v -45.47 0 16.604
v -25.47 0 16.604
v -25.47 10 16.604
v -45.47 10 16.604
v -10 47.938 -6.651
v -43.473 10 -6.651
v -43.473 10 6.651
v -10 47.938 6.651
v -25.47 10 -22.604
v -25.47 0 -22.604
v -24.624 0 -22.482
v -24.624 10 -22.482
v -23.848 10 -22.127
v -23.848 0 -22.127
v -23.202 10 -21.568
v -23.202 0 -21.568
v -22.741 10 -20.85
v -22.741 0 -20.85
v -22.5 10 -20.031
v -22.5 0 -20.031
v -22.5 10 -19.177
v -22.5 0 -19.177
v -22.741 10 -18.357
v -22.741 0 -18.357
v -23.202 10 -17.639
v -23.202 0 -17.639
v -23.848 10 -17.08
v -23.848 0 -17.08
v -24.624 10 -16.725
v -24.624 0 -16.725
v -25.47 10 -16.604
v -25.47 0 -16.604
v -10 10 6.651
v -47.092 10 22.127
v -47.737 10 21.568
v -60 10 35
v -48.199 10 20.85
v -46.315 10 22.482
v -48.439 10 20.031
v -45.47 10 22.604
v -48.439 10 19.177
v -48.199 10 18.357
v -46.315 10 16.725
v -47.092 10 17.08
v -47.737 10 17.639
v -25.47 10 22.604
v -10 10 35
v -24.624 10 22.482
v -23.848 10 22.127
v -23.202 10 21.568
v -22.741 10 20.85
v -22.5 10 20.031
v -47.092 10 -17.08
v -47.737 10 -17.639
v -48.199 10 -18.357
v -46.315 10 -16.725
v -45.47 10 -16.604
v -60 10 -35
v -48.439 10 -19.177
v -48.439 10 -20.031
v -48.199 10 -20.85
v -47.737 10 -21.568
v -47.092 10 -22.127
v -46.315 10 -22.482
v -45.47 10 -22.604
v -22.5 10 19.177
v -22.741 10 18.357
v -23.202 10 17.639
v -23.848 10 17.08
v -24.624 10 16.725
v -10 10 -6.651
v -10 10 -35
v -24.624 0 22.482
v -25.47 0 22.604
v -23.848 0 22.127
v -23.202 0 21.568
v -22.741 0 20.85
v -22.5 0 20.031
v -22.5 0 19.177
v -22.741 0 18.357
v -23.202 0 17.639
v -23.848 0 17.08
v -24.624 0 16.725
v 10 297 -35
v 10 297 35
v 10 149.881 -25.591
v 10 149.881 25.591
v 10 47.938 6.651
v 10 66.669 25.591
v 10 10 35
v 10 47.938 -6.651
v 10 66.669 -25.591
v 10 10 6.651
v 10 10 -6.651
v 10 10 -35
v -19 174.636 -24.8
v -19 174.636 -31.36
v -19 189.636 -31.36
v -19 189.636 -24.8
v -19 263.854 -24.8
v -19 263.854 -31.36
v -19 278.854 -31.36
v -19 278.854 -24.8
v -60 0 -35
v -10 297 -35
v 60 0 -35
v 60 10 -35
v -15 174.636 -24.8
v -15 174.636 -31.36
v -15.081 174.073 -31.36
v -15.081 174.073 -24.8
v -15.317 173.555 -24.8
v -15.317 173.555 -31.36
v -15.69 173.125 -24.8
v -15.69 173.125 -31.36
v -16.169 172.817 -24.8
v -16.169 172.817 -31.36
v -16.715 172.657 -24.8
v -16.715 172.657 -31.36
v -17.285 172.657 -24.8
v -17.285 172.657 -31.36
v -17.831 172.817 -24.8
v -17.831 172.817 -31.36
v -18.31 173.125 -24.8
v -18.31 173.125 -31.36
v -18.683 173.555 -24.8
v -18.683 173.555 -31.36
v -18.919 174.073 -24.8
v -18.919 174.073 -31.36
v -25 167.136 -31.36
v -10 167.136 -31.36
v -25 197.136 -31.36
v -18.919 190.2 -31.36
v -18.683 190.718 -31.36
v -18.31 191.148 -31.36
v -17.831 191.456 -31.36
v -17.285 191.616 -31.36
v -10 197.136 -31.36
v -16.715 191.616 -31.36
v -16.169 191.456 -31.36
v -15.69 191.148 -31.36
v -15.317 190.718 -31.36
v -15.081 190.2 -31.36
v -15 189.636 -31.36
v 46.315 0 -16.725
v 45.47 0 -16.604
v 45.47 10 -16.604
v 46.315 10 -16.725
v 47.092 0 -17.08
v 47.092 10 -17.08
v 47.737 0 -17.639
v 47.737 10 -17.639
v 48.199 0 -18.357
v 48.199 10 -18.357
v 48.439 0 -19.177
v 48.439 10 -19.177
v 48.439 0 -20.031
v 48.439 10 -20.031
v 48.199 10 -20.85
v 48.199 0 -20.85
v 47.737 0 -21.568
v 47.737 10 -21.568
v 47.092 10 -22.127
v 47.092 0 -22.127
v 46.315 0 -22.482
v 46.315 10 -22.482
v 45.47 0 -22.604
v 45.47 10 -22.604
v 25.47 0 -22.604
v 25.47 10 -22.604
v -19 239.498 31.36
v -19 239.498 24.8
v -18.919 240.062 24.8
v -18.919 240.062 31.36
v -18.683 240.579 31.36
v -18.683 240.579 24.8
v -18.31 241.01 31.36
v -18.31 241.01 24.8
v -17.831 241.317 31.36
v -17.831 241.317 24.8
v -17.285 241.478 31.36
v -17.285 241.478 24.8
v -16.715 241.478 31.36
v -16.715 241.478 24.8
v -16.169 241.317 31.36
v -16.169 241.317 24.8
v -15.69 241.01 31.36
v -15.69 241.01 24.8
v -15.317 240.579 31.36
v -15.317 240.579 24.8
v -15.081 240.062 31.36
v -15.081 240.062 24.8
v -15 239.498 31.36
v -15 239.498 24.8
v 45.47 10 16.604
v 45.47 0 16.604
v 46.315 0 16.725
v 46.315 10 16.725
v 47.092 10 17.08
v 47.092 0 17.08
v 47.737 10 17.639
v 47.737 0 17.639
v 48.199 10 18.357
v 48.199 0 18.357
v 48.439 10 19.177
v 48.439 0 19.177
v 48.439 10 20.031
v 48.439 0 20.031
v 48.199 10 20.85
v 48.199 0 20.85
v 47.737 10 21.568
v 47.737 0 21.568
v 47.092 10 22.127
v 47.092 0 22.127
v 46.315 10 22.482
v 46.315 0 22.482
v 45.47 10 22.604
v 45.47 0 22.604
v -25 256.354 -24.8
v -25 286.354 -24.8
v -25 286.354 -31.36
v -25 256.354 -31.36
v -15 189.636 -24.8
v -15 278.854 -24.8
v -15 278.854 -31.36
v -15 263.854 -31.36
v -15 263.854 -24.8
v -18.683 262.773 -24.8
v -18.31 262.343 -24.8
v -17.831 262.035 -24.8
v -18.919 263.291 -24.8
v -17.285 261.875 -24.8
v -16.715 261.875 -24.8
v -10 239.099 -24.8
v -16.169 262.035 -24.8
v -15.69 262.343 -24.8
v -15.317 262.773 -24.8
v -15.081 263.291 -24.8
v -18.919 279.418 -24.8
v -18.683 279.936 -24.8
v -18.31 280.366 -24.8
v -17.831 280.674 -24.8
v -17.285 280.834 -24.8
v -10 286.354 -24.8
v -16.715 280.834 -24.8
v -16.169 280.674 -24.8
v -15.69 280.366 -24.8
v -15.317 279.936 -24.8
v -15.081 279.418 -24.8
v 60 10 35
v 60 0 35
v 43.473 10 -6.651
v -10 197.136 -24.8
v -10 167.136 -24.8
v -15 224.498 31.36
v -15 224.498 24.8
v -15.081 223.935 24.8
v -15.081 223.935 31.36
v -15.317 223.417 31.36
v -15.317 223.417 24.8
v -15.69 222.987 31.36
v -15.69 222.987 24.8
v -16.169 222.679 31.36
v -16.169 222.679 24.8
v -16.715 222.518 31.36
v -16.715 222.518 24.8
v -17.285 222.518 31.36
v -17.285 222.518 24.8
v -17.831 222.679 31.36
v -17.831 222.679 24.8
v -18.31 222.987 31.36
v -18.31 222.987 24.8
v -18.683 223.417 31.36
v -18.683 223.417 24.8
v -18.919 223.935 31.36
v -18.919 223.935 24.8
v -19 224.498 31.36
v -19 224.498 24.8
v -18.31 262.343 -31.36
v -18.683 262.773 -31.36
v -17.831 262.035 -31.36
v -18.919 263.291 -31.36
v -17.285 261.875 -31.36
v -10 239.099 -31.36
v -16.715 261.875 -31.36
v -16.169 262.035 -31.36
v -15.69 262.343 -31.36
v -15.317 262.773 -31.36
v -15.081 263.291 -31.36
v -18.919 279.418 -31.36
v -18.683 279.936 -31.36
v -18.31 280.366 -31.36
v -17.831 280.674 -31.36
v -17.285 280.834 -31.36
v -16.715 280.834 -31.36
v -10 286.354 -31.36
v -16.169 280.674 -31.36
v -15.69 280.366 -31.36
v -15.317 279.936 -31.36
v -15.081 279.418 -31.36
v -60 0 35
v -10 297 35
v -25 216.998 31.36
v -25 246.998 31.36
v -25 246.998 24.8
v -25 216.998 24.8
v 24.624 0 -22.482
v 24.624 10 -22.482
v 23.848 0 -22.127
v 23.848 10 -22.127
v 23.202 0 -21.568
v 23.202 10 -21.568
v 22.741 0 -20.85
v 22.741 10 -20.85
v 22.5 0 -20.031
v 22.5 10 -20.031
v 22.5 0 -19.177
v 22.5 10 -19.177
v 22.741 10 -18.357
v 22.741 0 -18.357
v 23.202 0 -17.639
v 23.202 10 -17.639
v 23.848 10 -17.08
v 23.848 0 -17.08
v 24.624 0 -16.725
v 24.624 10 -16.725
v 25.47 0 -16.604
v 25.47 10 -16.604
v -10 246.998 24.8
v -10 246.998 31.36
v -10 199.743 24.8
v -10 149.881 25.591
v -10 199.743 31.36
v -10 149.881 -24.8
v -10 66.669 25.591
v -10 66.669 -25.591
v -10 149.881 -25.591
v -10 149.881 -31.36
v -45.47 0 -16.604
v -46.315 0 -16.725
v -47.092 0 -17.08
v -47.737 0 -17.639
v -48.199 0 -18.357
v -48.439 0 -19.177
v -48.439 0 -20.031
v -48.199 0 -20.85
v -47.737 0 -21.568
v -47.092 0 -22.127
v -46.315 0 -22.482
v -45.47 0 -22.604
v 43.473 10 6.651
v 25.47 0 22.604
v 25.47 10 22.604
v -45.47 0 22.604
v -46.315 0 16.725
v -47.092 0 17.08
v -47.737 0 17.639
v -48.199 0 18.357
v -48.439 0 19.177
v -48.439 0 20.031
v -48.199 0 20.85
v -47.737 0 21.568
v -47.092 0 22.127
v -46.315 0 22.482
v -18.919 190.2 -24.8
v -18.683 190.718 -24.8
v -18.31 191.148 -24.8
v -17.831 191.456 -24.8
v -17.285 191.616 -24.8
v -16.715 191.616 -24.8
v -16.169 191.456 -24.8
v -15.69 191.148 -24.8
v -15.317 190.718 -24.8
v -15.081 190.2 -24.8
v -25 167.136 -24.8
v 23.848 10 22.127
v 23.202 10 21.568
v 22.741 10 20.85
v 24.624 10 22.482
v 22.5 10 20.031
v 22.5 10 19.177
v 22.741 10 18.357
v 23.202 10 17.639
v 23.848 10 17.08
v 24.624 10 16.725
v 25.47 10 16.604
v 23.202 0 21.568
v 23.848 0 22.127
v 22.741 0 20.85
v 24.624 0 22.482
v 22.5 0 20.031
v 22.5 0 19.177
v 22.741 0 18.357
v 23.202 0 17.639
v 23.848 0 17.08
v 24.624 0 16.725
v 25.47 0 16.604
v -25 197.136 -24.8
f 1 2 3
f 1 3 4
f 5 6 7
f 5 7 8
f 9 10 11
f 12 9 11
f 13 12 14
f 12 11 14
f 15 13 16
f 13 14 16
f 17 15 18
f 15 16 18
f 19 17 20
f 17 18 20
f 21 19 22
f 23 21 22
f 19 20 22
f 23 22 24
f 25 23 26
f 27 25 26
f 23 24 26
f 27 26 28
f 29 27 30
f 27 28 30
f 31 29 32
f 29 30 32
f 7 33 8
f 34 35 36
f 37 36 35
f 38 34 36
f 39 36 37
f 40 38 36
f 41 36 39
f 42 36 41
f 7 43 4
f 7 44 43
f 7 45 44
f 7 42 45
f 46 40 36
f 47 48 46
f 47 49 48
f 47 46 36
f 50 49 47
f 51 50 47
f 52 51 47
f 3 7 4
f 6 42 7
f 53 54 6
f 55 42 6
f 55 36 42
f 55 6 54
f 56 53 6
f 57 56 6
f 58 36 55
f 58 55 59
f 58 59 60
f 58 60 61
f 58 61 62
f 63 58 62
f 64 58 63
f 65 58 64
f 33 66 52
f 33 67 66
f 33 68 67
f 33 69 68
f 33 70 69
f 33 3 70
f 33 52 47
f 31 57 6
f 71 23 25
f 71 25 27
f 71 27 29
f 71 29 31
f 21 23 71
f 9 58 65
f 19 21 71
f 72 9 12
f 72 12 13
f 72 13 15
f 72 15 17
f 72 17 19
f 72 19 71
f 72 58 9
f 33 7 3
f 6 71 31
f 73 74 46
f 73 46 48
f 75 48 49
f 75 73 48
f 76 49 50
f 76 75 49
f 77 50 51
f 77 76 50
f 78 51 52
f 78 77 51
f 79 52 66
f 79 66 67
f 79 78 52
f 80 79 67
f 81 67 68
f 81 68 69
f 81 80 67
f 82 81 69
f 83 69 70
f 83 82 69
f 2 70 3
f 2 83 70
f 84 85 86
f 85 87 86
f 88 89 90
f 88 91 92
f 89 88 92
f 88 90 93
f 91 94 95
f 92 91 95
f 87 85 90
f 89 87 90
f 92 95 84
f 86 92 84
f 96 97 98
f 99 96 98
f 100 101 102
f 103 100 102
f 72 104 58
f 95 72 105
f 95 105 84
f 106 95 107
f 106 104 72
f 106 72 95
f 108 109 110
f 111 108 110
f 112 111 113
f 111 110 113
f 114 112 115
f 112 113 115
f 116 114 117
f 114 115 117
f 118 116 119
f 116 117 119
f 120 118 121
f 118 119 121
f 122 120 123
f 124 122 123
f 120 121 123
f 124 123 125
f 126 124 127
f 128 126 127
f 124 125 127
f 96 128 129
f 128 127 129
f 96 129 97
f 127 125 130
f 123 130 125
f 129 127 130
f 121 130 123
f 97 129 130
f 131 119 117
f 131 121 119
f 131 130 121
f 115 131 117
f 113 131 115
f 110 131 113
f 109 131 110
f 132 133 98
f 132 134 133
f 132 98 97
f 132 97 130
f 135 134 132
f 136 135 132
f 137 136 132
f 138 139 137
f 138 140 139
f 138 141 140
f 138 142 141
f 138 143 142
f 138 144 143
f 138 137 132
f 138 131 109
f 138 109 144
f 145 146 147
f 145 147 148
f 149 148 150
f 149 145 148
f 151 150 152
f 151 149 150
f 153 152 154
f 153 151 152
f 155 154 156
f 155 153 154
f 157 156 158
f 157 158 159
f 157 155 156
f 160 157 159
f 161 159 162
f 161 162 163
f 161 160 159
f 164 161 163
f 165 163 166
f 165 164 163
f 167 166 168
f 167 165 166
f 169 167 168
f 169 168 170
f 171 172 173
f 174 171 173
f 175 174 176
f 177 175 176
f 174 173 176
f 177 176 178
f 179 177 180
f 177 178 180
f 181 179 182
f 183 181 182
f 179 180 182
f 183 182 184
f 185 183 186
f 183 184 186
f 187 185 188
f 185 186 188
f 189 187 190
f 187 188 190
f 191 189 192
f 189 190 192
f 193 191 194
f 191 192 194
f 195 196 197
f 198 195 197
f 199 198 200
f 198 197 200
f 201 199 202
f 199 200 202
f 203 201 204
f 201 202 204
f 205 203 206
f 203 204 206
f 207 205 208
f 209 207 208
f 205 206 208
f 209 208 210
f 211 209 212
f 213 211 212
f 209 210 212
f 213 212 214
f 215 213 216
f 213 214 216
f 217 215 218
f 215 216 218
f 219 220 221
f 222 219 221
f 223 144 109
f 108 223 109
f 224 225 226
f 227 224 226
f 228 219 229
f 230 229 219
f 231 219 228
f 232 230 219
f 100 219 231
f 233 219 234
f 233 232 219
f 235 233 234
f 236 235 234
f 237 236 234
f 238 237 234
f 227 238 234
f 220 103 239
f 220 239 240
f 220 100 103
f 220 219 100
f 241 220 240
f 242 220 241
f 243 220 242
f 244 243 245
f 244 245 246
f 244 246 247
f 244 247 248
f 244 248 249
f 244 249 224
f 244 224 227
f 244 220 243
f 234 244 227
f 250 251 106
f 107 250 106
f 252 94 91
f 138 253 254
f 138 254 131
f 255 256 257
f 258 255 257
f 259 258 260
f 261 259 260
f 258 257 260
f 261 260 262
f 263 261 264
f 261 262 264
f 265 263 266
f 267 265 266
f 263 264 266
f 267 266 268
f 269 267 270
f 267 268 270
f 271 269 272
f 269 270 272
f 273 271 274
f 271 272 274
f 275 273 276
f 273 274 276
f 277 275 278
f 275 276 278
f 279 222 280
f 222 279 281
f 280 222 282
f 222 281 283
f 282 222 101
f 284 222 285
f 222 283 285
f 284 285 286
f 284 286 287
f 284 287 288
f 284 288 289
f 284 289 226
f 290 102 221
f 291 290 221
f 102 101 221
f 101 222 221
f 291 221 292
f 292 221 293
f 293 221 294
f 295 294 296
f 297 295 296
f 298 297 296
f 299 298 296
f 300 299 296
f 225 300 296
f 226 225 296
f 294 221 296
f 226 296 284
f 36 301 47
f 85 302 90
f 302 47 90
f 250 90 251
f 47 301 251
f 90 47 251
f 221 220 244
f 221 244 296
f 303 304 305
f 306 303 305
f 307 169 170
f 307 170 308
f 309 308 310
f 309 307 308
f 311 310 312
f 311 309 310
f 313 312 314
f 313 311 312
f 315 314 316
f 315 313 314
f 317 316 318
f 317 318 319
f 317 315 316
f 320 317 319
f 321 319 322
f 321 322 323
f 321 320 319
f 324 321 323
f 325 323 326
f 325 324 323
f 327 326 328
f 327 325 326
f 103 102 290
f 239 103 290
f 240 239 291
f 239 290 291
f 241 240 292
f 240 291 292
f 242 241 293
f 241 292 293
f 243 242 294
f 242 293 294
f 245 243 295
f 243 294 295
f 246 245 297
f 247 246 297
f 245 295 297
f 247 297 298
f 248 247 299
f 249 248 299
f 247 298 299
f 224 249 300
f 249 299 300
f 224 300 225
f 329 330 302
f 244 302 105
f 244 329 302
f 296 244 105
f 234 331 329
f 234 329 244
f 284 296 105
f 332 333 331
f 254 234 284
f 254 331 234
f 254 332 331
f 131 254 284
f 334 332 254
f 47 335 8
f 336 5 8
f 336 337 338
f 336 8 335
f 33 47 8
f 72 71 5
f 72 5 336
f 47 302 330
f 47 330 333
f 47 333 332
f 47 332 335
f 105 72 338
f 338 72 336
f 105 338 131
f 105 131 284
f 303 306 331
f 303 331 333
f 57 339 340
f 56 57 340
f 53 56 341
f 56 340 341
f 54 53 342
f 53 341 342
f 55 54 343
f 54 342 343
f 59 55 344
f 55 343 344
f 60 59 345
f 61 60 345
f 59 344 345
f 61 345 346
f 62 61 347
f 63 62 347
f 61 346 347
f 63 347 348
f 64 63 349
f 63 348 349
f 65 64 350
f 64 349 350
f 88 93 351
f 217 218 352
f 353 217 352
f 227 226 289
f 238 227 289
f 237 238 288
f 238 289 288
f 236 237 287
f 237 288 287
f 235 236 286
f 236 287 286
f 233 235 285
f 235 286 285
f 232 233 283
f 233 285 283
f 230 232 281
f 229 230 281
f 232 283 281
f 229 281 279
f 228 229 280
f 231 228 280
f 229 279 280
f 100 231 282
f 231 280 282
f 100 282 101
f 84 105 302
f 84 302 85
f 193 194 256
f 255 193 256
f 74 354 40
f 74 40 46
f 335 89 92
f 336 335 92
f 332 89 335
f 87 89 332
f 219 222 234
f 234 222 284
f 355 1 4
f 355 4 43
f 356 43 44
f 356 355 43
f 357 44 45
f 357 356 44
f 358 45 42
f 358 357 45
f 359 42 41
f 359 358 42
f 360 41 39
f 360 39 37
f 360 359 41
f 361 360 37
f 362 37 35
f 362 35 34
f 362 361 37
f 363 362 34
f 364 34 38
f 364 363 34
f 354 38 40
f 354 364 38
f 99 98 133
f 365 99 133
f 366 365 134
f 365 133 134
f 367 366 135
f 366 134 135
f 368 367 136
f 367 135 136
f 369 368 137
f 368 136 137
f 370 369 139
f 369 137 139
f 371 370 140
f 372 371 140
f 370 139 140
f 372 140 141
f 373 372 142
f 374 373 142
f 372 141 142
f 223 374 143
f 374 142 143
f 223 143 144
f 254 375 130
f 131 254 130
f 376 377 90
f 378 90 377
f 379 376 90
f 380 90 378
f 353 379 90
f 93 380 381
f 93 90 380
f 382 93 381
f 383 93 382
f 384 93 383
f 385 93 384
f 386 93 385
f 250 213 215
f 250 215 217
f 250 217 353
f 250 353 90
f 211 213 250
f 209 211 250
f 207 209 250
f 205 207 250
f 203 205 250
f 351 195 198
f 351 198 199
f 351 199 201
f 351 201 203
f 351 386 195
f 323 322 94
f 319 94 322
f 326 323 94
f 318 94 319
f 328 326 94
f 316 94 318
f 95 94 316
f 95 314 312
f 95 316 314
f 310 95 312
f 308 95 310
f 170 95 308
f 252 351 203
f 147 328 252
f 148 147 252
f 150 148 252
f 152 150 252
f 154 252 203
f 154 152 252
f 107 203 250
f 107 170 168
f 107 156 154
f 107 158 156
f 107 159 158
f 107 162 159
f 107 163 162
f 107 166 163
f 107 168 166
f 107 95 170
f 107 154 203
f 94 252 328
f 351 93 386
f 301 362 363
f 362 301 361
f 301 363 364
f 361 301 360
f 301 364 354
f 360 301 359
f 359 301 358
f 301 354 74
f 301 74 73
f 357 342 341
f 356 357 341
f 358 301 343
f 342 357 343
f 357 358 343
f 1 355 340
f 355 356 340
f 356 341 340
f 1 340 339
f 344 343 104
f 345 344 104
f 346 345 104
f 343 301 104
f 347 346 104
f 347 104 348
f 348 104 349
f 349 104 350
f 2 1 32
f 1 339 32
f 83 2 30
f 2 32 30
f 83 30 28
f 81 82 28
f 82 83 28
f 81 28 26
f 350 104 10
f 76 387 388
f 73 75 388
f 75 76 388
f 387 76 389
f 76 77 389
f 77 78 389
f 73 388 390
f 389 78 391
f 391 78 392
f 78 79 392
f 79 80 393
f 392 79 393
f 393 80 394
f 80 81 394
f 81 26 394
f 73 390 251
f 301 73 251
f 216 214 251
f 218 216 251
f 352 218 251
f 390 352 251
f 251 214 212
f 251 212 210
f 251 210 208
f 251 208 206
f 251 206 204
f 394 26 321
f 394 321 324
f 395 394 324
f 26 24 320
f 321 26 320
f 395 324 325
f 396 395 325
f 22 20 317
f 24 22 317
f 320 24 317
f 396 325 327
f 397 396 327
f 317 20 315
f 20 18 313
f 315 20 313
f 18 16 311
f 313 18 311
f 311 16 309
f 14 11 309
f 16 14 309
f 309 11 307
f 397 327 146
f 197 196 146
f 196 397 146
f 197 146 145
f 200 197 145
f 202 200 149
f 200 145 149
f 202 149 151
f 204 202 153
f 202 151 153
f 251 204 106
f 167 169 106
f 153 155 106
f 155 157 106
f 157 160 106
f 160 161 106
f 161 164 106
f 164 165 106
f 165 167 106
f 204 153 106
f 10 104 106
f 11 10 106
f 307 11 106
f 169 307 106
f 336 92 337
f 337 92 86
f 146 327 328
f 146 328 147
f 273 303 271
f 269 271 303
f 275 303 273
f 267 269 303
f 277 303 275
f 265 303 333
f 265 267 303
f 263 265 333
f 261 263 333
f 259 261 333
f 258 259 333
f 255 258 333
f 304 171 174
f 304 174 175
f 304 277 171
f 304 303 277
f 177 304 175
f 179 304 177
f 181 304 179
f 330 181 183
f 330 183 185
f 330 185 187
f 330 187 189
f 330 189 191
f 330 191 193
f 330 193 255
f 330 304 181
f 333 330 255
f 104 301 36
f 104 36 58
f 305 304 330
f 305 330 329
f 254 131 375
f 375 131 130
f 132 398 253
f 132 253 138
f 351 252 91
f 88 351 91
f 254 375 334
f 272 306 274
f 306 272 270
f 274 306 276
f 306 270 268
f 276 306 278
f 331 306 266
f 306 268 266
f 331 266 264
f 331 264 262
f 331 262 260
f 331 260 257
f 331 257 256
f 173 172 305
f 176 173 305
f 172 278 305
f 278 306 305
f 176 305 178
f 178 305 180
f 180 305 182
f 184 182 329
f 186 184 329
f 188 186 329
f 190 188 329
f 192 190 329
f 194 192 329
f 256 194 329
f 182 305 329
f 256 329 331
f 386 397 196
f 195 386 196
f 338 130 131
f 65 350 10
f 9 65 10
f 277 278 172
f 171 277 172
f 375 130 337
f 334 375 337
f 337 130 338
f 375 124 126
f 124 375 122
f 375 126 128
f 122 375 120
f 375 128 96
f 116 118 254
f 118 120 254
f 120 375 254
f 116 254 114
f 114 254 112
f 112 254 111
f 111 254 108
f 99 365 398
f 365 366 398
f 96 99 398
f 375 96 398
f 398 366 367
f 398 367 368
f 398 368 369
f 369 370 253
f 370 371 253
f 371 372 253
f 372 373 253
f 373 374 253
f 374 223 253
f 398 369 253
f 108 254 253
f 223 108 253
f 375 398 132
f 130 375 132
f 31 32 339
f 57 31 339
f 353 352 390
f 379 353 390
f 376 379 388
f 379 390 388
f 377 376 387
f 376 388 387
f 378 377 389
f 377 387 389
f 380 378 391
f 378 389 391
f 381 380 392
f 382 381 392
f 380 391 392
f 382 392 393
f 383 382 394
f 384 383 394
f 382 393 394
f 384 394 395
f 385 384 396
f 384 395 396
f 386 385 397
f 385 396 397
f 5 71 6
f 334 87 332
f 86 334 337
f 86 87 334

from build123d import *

# Parameters (mm, degrees)
SKETCH1_W               = 120
SKETCH1_H               = 70
BOSS_EXTRUDE1_DEPTH     = 10
SKETCH1_3_W             = 20
SKETCH1_3_H             = 70
BOSS_EXTRUDE2_DEPTH     = 162
BOSS_EXTRUDE3_START     = -20
SKETCH2_W               = 6.560281302
SKETCH2_H               = 30
BOSS_EXTRUDE3_DEPTH     = 15
BOSS_EXTRUDE3_2_DEPTH   = 15
BOSS_EXTRUDE3_3_DEPTH   = 15
CUT_EXTRUDE3_DEPTH      = 101.2
CUT_EXTRUDE3_DEPTH_BACK = 127.2
SKETCH7_W               = 20
SKETCH7_H               = 70
BOSS_EXTRUDE4_DEPTH     = 135
SKETCH12_W              = 15
SKETCH12_H              = 6.560281302
BOSS_EXTRUDE6_DEPTH     = 26.31701322
BOSS_EXTRUDE7_START     = -31.360281302
BOSS_EXTRUDE7_DEPTH     = 6.560281302
BOSS_EXTRUDE8_START     = -31.360281302
BOSS_EXTRUDE8_DEPTH     = 6.560281302
SKETCH3_W               = 51.18180782
SKETCH3_H               = 83.211673014
CUT_EXTRUDE1_DEPTH      = 60
BOSS_EXTRUDE9_START     = -6.650550524
BOSS_EXTRUDE9_DEPTH     = 13.301101048


# Read off the part's stored shape, not the designer's step: Boss-Extrude7, Boss-Extrude8, Boss-Extrude9
with BuildPart() as part:
    # Sketch1 → Boss-Extrude1 (new body)
    with BuildSketch(Plane(origin=(0, 0, 0), x_dir=(1, 0, 0), z_dir=(0, 1, 0))):
        Rectangle(SKETCH1_W, SKETCH1_H)
        with BuildLine():
            Line((-45.469645663, 22.603573917), (-25.469645663, 22.603573917))
            ThreePointArc((-25.469645663, 22.603573917), (-22.469645663, 19.603573917), (-25.469645663, 16.603573917))
            Line((-25.469645663, 16.603573917), (-45.469645663, 16.603573917))
            ThreePointArc((-45.469645663, 16.603573917), (-48.469645663, 19.603573917), (-45.469645663, 22.603573917))
        make_face(mode=Mode.SUBTRACT)
        with BuildLine():
            Line((45.469645663, 22.603573917), (25.469645663, 22.603573917))
            ThreePointArc((25.469645663, 22.603573917), (22.469645663, 19.603573917), (25.469645663, 16.603573917))
            Line((25.469645663, 16.603573917), (45.469645663, 16.603573917))
            ThreePointArc((45.469645663, 16.603573917), (48.469645663, 19.603573917), (45.469645663, 22.603573917))
        make_face(mode=Mode.SUBTRACT)
        with BuildLine():
            Line((45.469645663, -22.603573917), (25.469645663, -22.603573917))
            ThreePointArc((25.469645663, -22.603573917), (22.469645663, -19.603573917), (25.469645663, -16.603573917))
            Line((25.469645663, -16.603573917), (45.469645663, -16.603573917))
            ThreePointArc((45.469645663, -16.603573917), (48.469645663, -19.603573917), (45.469645663, -22.603573917))
        make_face(mode=Mode.SUBTRACT)
        with BuildLine():
            Line((-45.469645663, -22.603573917), (-25.469645663, -22.603573917))
            ThreePointArc((-25.469645663, -22.603573917), (-22.469645663, -19.603573917), (-25.469645663, -16.603573917))
            Line((-25.469645663, -16.603573917), (-45.469645663, -16.603573917))
            ThreePointArc((-45.469645663, -16.603573917), (-48.469645663, -19.603573917), (-45.469645663, -22.603573917))
        make_face(mode=Mode.SUBTRACT)
    extrude(amount=BOSS_EXTRUDE1_DEPTH)

    # Sketch1<3> → Boss-Extrude2 (add)
    with BuildSketch(Plane(origin=(0, 0, 0), x_dir=(1, 0, 0), z_dir=(0, 1, 0))):
        Rectangle(SKETCH1_3_W, SKETCH1_3_H)
    extrude(amount=BOSS_EXTRUDE2_DEPTH)


with BuildPart() as body_2:
    # Sketch2 → Boss-Extrude3 (new body)
    with BuildSketch(Plane(origin=(10, 0, 0), x_dir=(0, 0, -1), z_dir=(1, 0, 0)).offset(BOSS_EXTRUDE3_START)):
        with Locations((-28.080140651, 231.998095635)):
            Rectangle(SKETCH2_W, SKETCH2_H)
    extrude(amount=-BOSS_EXTRUDE3_DEPTH)


with BuildPart() as body_3:
    # Sketch2 → Boss-Extrude3 2 (new body)
    with BuildSketch(Plane(origin=(10, 0, 0), x_dir=(0, 0, -1), z_dir=(1, 0, 0)).offset(BOSS_EXTRUDE3_START)):
        with Locations((28.080140651, 182.13639327)):
            Rectangle(SKETCH2_W, SKETCH2_H)
    extrude(amount=-BOSS_EXTRUDE3_2_DEPTH)


with BuildPart() as body_4:
    # Sketch2 → Boss-Extrude3 3 (new body)
    with BuildSketch(Plane(origin=(10, 0, 0), x_dir=(0, 0, -1), z_dir=(1, 0, 0)).offset(BOSS_EXTRUDE3_START)):
        with Locations((28.080140651, 271.354236176)):
            Rectangle(SKETCH2_W, SKETCH2_H)
    extrude(amount=-BOSS_EXTRUDE3_3_DEPTH)


with BuildPart() as cut_extrude3_tool:
    # Sketch5 → Cut-Extrude3 (new, two sides: drawn at the far end of the back side and taken through both)
    with BuildSketch(Plane.XY.offset(-24.8).offset(-CUT_EXTRUDE3_DEPTH_BACK)):
        with BuildLine():
            Line((-15, 239.498095635), (-15, 224.498095635))
            ThreePointArc((-15, 224.498095635), (-17, 222.498095635), (-19, 224.498095635))
            Line((-19, 224.498095635), (-19, 239.498095635))
            ThreePointArc((-19, 239.498095635), (-17, 241.498095635), (-15, 239.498095635))
        make_face()
        with BuildLine():
            Line((-15, 189.63639327), (-15, 174.63639327))
            ThreePointArc((-15, 174.63639327), (-17, 172.63639327), (-19, 174.63639327))
            Line((-19, 174.63639327), (-19, 189.63639327))
            ThreePointArc((-19, 189.63639327), (-17, 191.63639327), (-15, 189.63639327))
        make_face()
        with BuildLine():
            Line((-15, 278.854236176), (-15, 263.854236176))
            ThreePointArc((-15, 263.854236176), (-17, 261.854236176), (-19, 263.854236176))
            Line((-19, 263.854236176), (-19, 278.854236176))
            ThreePointArc((-19, 278.854236176), (-17, 280.854236176), (-15, 278.854236176))
        make_face()
    extrude(amount=CUT_EXTRUDE3_DEPTH + CUT_EXTRUDE3_DEPTH_BACK)


with BuildPart() as body_2_1:
    add(body_2.part)

    # Cut-Extrude3: cut by cut_extrude3_tool
    add(cut_extrude3_tool.part, mode=Mode.SUBTRACT)



with BuildPart() as body_3_1:
    add(body_3.part)

    # Cut-Extrude3: cut by cut_extrude3_tool
    add(cut_extrude3_tool.part, mode=Mode.SUBTRACT)


with BuildPart() as body_4_1:
    add(body_4.part)

    # Cut-Extrude3: cut by cut_extrude3_tool
    add(cut_extrude3_tool.part, mode=Mode.SUBTRACT)


with BuildPart() as body_2_2:
    add(body_2_1.part)

    add(body_4_1.part)  # Boss-Extrude4 merges body 4

    add(part.part)  # Boss-Extrude4 merges part
    # Sketch7 → Boss-Extrude4 (add)
    with BuildSketch(Plane(origin=(0, 162, 0), x_dir=(1, 0, 0), z_dir=(0, 1, 0))):
        Rectangle(SKETCH7_W, SKETCH7_H)
    extrude(amount=BOSS_EXTRUDE4_DEPTH)

    # Sketch12 → Boss-Extrude6 (add, along a direction that is not the sketch's normal)
    with BuildSketch(Plane.XZ.offset(-216.998095635)):
        with Locations((-17.5, 28.080140651)):
            Rectangle(SKETCH12_W, SKETCH12_H)
    extrude(amount=BOSS_EXTRUDE6_DEPTH, dir=(0.6560590289905114, -0.7547095802227685, 0))

    # Boss-Extrude7 outline → Boss-Extrude7 (add)
    with BuildSketch(Plane.XY.offset(BOSS_EXTRUDE7_START)):
        Polygon((-25, 256.354236176), (-10, 239.098710067), (-10, 256.354236176), align=None)
    extrude(amount=BOSS_EXTRUDE7_DEPTH)

    # Boss-Extrude8 outline → Boss-Extrude8 (add)
    with BuildSketch(Plane.XY.offset(BOSS_EXTRUDE8_START)):
        Polygon((-10, 167.13639327), (-25, 167.13639327), (-10, 149.880867162), align=None)
    extrude(amount=BOSS_EXTRUDE8_DEPTH)

    # Sketch3 → Cut-Extrude1 (cut)
    with BuildSketch(Plane(origin=(10, 0, 0), x_dir=(0, 0, -1), z_dir=(1, 0, 0))):
        with Locations((0, 108.275030655)):
            Rectangle(SKETCH3_W, SKETCH3_H)
    extrude(amount=-CUT_EXTRUDE1_DEPTH, mode=Mode.SUBTRACT)

    # Boss-Extrude9 outline → Boss-Extrude9 (add)
    with BuildSketch(Plane.XY.offset(BOSS_EXTRUDE9_START)):
        Polygon((43.472980585, 10), (10, 47.93773671), (10, 10), align=None)
    boss_extrude9 = extrude(amount=BOSS_EXTRUDE9_DEPTH)

    # Mirror1: Boss-Extrude9 across plane
    add(boss_extrude9.mirror(Plane(origin=(0, 0, 0), x_dir=(0, 0, 1), z_dir=(1, 0, 0))))


solid = Compound([body_3_1.part, body_2_2.part])
